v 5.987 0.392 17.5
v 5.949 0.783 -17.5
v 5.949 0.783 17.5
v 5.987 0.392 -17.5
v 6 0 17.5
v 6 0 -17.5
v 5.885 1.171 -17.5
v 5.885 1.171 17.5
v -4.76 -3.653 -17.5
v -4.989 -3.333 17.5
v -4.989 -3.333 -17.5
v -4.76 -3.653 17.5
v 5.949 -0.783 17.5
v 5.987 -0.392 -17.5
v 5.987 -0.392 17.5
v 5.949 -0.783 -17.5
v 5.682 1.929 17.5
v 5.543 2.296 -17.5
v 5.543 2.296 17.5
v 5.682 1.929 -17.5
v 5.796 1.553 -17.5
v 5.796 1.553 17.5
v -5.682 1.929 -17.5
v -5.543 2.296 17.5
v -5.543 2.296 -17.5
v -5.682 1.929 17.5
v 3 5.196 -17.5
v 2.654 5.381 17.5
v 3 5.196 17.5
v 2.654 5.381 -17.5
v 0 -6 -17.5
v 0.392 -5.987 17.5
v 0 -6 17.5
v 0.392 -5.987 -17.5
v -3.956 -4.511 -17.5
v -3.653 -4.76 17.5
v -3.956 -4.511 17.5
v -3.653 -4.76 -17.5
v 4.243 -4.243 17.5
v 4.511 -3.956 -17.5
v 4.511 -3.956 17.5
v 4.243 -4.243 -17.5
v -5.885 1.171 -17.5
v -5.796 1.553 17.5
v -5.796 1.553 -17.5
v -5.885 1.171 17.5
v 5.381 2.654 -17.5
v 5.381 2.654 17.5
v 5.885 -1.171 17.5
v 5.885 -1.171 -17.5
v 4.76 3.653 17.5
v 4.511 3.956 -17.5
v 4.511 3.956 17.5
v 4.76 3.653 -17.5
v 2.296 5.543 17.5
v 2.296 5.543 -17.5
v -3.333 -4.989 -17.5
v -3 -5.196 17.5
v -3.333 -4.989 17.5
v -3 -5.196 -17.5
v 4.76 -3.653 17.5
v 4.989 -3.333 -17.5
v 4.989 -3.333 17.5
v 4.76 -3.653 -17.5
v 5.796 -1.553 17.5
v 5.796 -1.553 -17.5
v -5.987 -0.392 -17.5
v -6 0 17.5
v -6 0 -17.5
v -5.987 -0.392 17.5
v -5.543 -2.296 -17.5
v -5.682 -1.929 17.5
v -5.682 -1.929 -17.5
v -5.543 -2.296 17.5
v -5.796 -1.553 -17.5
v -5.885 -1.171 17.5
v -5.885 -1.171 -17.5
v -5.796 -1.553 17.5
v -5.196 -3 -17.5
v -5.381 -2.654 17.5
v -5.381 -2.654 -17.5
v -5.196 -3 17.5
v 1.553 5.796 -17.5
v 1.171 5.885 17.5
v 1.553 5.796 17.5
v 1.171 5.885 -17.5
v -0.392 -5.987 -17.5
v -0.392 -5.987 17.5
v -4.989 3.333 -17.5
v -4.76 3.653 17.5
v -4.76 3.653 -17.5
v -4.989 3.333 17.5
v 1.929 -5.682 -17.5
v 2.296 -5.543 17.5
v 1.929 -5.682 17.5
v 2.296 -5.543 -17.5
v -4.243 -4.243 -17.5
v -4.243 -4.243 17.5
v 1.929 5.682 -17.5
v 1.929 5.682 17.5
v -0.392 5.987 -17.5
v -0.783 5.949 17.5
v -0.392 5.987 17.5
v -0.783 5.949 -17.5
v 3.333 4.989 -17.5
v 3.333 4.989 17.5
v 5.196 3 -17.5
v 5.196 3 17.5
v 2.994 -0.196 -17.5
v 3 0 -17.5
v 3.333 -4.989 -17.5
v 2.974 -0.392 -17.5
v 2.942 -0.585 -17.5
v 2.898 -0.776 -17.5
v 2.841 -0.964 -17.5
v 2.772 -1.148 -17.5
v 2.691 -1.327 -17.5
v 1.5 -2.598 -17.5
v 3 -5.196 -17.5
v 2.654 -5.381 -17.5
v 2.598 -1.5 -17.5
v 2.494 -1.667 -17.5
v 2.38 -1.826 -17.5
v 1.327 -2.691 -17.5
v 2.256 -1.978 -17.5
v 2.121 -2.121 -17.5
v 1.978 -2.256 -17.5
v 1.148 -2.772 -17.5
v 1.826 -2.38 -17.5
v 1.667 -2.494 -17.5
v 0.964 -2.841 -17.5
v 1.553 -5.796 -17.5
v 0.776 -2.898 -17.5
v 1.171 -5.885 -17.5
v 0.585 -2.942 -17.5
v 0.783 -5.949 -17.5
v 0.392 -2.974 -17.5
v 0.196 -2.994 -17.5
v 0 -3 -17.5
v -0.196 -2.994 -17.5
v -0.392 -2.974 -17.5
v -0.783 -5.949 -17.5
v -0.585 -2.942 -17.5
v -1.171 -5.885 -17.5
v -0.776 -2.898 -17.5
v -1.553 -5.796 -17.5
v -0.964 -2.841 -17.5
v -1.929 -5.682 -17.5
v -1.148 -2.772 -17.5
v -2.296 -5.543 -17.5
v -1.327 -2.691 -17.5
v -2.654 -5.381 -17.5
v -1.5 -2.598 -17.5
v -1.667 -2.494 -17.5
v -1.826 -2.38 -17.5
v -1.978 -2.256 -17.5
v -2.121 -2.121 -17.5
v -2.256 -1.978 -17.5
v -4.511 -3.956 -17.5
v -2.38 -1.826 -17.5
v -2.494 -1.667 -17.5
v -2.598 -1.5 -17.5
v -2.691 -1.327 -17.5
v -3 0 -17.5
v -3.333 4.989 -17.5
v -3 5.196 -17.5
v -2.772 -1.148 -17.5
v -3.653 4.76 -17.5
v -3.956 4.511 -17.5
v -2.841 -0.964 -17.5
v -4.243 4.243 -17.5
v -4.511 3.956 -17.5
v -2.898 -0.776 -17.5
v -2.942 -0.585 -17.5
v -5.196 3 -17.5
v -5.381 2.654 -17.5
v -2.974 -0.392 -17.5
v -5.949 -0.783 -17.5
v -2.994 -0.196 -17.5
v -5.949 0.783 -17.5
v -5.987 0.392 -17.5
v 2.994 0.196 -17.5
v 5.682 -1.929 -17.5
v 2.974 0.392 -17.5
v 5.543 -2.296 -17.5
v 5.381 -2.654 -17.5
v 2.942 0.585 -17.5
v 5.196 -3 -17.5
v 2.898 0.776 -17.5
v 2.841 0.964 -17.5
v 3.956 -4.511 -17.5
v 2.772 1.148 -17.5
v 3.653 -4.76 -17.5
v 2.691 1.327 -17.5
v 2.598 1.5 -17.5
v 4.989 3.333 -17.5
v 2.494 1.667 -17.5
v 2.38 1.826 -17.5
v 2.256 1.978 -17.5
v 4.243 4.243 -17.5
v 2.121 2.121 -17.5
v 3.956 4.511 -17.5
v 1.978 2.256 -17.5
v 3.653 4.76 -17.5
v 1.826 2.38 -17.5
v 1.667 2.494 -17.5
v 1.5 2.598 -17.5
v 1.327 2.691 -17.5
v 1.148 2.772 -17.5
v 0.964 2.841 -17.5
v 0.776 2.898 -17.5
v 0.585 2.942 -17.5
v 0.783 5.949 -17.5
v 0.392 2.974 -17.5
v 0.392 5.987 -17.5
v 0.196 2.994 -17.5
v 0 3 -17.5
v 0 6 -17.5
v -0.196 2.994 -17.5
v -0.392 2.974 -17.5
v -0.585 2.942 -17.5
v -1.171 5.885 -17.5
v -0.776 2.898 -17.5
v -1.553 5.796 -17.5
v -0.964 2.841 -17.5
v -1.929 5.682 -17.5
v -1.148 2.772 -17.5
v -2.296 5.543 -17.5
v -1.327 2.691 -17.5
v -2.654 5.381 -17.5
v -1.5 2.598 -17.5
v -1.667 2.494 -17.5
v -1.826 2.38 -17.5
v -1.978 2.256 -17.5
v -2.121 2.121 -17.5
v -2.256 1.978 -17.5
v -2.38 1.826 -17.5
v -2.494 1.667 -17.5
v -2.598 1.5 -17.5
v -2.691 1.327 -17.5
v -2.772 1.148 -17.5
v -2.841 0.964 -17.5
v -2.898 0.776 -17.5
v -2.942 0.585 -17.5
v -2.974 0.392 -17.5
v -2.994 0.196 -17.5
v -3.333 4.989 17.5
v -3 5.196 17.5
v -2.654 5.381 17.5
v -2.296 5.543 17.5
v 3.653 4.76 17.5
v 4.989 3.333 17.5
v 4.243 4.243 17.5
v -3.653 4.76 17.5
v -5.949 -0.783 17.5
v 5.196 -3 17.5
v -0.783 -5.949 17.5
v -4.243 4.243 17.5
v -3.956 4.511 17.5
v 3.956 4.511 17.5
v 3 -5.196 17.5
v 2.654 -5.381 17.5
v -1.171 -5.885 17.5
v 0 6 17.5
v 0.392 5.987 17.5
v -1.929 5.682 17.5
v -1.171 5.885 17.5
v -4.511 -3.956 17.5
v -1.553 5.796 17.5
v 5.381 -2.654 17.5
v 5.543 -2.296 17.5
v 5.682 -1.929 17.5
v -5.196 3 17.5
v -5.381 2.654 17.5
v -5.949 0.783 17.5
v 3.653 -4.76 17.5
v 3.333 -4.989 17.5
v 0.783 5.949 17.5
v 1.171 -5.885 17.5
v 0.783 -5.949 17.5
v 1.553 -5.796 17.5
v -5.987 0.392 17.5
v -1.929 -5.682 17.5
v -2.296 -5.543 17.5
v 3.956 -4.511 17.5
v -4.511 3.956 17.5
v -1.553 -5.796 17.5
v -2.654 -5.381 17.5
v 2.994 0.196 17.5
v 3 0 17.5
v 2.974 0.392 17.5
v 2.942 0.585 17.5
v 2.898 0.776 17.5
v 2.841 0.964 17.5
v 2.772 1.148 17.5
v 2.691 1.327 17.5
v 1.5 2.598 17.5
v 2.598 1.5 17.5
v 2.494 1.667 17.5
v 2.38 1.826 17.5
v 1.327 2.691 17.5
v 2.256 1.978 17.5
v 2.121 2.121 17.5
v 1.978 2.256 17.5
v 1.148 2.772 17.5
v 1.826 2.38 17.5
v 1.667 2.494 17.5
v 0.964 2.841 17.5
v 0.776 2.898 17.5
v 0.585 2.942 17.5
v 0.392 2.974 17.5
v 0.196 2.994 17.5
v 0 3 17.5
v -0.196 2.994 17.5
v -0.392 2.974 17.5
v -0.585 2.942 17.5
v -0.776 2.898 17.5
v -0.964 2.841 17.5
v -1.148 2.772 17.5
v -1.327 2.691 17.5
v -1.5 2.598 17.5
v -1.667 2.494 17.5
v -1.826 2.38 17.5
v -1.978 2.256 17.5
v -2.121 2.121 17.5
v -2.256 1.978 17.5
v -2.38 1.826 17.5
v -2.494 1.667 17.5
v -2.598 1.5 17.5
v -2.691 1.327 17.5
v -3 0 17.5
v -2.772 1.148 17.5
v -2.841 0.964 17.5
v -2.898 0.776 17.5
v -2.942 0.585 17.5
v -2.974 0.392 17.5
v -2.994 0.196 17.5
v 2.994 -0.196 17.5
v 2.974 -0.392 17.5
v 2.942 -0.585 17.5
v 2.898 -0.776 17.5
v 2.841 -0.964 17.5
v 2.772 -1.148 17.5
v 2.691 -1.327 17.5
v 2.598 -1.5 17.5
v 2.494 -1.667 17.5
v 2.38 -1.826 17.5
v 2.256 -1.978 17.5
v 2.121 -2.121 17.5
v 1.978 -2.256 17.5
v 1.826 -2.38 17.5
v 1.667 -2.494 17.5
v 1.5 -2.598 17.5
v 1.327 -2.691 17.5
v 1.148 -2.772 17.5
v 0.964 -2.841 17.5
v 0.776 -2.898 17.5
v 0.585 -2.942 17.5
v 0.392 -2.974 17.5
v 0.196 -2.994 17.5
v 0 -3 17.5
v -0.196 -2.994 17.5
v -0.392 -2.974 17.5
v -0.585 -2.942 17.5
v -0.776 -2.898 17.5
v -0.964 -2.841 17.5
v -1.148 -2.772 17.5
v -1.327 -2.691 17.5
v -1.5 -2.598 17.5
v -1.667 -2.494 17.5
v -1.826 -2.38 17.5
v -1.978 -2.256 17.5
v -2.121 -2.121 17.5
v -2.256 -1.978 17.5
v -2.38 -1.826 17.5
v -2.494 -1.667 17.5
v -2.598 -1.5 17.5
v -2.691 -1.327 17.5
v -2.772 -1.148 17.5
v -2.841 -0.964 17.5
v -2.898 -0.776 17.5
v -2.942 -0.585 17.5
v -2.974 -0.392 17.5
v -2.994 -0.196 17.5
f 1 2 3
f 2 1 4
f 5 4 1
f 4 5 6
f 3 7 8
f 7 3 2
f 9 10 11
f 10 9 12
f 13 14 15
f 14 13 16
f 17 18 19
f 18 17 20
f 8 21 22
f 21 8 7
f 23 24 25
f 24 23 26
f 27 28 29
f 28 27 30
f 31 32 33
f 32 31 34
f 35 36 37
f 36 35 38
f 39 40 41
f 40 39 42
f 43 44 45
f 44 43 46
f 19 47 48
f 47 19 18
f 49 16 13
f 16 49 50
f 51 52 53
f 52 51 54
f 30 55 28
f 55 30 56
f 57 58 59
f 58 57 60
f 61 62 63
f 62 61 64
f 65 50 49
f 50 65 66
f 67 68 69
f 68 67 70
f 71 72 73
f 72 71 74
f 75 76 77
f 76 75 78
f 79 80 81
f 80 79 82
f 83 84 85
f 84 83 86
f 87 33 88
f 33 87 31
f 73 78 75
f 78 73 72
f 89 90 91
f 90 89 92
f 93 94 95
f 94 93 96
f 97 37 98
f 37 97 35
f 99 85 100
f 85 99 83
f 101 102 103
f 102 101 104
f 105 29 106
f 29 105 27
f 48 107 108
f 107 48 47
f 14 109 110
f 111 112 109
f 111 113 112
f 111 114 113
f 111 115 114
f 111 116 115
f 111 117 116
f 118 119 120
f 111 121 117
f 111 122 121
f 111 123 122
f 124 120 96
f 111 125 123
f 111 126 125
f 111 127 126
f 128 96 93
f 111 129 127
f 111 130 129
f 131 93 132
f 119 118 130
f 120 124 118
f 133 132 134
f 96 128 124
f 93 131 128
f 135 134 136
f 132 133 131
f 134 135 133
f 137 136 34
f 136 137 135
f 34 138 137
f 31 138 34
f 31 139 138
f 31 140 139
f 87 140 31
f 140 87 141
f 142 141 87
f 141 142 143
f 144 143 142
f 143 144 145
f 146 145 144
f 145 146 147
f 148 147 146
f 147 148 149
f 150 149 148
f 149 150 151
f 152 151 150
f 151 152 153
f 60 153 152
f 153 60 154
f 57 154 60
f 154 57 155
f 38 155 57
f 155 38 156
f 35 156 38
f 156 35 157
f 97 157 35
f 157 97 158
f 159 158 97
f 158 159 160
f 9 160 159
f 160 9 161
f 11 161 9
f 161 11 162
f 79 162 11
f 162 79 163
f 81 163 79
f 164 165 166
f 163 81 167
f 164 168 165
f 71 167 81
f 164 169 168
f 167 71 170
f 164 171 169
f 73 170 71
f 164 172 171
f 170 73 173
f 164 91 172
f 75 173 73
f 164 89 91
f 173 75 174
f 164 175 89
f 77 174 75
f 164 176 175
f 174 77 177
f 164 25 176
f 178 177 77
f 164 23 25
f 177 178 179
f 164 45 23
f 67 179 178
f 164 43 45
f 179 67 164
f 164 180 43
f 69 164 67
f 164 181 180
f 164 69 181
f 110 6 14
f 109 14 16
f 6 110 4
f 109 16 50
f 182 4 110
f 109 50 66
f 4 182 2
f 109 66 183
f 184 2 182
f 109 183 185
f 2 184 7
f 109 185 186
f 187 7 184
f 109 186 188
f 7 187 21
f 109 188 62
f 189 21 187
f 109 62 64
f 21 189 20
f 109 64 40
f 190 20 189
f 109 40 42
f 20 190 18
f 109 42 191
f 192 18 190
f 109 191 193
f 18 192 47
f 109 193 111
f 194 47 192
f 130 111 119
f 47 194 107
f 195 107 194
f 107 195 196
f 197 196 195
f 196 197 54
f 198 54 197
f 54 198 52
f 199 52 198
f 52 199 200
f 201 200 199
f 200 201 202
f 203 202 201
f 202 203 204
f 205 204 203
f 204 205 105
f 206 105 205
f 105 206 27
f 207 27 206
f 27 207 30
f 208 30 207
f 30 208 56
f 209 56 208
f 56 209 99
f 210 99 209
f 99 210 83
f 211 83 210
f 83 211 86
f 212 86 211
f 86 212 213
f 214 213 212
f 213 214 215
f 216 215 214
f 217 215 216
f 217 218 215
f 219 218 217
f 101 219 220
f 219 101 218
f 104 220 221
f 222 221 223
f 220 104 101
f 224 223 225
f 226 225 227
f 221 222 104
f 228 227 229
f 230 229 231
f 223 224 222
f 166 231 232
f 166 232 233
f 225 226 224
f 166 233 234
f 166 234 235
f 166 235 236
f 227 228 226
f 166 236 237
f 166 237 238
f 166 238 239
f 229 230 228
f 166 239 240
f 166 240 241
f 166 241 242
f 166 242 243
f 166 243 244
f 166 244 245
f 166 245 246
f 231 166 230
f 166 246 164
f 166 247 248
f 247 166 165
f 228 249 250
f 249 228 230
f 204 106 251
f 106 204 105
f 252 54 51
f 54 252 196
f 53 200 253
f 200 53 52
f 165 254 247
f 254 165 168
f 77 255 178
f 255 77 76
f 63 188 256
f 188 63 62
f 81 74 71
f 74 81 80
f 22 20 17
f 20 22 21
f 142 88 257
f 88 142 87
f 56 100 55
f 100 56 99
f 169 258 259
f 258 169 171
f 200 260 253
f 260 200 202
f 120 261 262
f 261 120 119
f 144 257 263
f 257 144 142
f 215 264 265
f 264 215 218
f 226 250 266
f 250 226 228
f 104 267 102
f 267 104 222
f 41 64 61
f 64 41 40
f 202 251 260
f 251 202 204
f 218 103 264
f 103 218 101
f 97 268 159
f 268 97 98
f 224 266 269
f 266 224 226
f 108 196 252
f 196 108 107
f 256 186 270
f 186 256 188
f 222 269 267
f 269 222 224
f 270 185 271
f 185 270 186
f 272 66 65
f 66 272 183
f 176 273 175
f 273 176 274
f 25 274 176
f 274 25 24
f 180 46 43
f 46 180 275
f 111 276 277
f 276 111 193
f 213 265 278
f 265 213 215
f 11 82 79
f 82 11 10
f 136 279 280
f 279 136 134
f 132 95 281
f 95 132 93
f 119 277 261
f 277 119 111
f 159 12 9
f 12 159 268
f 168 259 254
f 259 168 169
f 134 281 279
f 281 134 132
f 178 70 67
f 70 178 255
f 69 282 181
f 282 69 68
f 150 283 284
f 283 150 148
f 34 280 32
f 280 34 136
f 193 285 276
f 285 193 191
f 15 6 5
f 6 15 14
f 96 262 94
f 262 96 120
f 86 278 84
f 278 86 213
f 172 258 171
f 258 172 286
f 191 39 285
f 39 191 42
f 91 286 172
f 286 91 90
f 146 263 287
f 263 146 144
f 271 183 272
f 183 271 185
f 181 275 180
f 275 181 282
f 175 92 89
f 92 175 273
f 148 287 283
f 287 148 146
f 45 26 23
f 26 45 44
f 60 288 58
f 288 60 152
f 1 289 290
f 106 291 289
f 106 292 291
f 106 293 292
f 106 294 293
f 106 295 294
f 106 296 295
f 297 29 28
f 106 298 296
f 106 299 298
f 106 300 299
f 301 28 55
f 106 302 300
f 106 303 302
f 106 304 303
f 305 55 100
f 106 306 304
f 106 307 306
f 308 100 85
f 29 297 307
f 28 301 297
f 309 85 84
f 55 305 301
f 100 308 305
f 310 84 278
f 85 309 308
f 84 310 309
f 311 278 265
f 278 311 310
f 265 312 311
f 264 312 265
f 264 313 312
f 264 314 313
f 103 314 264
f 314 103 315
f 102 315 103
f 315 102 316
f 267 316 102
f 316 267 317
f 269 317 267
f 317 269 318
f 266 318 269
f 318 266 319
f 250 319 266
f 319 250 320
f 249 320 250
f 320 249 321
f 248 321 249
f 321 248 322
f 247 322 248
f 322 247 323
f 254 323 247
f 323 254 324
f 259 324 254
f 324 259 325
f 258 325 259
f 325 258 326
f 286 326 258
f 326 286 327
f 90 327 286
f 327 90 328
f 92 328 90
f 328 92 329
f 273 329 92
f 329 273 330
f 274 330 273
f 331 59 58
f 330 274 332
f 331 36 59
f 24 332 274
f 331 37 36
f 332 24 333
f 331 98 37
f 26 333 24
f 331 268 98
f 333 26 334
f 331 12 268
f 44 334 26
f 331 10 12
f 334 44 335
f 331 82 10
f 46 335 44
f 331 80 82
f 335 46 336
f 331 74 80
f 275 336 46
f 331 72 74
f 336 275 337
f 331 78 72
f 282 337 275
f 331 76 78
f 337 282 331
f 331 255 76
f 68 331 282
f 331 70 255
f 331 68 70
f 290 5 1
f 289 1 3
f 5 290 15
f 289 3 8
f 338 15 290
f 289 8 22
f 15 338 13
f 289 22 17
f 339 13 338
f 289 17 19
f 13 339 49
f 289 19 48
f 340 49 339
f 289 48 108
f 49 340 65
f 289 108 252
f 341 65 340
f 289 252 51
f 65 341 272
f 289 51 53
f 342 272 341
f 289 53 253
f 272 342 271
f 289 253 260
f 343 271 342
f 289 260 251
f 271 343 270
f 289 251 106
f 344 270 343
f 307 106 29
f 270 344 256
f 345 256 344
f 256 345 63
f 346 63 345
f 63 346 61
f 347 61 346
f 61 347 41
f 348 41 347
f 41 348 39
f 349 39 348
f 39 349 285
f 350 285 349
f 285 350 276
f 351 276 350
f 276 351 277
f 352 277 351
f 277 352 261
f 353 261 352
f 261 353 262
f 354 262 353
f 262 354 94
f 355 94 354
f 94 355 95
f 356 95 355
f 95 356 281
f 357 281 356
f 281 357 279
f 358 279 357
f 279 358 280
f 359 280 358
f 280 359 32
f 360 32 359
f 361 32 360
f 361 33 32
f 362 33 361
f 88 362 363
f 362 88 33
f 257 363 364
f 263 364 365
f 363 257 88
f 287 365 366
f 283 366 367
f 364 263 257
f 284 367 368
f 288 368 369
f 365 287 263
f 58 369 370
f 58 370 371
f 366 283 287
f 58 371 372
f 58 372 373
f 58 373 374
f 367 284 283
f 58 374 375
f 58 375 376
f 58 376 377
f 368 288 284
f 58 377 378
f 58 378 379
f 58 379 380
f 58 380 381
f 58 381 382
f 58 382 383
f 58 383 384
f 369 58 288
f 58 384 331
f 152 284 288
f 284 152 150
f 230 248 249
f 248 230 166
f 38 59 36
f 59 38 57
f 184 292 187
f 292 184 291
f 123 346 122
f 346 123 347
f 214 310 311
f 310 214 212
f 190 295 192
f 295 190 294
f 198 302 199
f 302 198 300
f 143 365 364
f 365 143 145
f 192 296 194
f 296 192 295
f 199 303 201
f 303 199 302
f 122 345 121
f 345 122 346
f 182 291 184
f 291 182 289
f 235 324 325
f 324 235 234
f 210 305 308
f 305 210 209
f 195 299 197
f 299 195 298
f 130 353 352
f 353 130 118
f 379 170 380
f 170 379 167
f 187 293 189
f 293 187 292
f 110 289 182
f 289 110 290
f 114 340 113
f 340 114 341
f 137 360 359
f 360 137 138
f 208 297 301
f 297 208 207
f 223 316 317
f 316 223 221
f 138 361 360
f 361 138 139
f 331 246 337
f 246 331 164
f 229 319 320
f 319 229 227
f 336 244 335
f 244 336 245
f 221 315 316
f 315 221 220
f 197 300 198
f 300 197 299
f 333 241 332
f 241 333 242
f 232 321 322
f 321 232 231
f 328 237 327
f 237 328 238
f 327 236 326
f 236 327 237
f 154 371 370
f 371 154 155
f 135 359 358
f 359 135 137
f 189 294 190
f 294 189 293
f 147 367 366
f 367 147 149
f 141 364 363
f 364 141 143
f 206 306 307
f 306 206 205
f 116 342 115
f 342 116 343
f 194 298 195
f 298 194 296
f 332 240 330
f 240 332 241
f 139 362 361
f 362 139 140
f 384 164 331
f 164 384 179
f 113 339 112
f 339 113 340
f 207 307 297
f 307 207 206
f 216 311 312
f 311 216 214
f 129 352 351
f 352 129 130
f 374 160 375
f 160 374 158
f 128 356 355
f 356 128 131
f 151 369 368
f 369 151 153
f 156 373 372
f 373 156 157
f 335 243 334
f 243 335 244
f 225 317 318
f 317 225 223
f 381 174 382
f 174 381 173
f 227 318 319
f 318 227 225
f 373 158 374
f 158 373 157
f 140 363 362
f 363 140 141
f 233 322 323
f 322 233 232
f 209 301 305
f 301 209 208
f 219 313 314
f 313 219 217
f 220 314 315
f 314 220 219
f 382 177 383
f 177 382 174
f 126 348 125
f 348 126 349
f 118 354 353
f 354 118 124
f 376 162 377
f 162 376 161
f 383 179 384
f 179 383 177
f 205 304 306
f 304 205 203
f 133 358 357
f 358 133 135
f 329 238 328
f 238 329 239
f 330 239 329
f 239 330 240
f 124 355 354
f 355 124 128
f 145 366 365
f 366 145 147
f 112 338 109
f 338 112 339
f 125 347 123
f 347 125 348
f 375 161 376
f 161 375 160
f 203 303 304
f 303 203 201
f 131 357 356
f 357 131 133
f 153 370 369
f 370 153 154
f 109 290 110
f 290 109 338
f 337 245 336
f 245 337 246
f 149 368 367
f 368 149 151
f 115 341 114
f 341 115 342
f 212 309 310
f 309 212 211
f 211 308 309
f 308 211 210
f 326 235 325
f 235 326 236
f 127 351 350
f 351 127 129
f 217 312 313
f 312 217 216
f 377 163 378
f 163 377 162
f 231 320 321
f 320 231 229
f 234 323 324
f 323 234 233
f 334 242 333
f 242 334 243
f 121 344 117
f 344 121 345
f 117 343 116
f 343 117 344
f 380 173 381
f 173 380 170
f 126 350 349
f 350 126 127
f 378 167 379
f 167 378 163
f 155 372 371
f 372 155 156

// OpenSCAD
$fn=96;

bore_d = 6.0;
od_d = 12.0;
len = 35.0;

module linear_bearing(bore_d, od_d, len){
    difference(){
        cylinder(d=od_d, h=len, center=true);
        cylinder(d=bore_d, h=len+0.2, center=true);
    }
}

linear_bearing(bore_d, od_d, len);
